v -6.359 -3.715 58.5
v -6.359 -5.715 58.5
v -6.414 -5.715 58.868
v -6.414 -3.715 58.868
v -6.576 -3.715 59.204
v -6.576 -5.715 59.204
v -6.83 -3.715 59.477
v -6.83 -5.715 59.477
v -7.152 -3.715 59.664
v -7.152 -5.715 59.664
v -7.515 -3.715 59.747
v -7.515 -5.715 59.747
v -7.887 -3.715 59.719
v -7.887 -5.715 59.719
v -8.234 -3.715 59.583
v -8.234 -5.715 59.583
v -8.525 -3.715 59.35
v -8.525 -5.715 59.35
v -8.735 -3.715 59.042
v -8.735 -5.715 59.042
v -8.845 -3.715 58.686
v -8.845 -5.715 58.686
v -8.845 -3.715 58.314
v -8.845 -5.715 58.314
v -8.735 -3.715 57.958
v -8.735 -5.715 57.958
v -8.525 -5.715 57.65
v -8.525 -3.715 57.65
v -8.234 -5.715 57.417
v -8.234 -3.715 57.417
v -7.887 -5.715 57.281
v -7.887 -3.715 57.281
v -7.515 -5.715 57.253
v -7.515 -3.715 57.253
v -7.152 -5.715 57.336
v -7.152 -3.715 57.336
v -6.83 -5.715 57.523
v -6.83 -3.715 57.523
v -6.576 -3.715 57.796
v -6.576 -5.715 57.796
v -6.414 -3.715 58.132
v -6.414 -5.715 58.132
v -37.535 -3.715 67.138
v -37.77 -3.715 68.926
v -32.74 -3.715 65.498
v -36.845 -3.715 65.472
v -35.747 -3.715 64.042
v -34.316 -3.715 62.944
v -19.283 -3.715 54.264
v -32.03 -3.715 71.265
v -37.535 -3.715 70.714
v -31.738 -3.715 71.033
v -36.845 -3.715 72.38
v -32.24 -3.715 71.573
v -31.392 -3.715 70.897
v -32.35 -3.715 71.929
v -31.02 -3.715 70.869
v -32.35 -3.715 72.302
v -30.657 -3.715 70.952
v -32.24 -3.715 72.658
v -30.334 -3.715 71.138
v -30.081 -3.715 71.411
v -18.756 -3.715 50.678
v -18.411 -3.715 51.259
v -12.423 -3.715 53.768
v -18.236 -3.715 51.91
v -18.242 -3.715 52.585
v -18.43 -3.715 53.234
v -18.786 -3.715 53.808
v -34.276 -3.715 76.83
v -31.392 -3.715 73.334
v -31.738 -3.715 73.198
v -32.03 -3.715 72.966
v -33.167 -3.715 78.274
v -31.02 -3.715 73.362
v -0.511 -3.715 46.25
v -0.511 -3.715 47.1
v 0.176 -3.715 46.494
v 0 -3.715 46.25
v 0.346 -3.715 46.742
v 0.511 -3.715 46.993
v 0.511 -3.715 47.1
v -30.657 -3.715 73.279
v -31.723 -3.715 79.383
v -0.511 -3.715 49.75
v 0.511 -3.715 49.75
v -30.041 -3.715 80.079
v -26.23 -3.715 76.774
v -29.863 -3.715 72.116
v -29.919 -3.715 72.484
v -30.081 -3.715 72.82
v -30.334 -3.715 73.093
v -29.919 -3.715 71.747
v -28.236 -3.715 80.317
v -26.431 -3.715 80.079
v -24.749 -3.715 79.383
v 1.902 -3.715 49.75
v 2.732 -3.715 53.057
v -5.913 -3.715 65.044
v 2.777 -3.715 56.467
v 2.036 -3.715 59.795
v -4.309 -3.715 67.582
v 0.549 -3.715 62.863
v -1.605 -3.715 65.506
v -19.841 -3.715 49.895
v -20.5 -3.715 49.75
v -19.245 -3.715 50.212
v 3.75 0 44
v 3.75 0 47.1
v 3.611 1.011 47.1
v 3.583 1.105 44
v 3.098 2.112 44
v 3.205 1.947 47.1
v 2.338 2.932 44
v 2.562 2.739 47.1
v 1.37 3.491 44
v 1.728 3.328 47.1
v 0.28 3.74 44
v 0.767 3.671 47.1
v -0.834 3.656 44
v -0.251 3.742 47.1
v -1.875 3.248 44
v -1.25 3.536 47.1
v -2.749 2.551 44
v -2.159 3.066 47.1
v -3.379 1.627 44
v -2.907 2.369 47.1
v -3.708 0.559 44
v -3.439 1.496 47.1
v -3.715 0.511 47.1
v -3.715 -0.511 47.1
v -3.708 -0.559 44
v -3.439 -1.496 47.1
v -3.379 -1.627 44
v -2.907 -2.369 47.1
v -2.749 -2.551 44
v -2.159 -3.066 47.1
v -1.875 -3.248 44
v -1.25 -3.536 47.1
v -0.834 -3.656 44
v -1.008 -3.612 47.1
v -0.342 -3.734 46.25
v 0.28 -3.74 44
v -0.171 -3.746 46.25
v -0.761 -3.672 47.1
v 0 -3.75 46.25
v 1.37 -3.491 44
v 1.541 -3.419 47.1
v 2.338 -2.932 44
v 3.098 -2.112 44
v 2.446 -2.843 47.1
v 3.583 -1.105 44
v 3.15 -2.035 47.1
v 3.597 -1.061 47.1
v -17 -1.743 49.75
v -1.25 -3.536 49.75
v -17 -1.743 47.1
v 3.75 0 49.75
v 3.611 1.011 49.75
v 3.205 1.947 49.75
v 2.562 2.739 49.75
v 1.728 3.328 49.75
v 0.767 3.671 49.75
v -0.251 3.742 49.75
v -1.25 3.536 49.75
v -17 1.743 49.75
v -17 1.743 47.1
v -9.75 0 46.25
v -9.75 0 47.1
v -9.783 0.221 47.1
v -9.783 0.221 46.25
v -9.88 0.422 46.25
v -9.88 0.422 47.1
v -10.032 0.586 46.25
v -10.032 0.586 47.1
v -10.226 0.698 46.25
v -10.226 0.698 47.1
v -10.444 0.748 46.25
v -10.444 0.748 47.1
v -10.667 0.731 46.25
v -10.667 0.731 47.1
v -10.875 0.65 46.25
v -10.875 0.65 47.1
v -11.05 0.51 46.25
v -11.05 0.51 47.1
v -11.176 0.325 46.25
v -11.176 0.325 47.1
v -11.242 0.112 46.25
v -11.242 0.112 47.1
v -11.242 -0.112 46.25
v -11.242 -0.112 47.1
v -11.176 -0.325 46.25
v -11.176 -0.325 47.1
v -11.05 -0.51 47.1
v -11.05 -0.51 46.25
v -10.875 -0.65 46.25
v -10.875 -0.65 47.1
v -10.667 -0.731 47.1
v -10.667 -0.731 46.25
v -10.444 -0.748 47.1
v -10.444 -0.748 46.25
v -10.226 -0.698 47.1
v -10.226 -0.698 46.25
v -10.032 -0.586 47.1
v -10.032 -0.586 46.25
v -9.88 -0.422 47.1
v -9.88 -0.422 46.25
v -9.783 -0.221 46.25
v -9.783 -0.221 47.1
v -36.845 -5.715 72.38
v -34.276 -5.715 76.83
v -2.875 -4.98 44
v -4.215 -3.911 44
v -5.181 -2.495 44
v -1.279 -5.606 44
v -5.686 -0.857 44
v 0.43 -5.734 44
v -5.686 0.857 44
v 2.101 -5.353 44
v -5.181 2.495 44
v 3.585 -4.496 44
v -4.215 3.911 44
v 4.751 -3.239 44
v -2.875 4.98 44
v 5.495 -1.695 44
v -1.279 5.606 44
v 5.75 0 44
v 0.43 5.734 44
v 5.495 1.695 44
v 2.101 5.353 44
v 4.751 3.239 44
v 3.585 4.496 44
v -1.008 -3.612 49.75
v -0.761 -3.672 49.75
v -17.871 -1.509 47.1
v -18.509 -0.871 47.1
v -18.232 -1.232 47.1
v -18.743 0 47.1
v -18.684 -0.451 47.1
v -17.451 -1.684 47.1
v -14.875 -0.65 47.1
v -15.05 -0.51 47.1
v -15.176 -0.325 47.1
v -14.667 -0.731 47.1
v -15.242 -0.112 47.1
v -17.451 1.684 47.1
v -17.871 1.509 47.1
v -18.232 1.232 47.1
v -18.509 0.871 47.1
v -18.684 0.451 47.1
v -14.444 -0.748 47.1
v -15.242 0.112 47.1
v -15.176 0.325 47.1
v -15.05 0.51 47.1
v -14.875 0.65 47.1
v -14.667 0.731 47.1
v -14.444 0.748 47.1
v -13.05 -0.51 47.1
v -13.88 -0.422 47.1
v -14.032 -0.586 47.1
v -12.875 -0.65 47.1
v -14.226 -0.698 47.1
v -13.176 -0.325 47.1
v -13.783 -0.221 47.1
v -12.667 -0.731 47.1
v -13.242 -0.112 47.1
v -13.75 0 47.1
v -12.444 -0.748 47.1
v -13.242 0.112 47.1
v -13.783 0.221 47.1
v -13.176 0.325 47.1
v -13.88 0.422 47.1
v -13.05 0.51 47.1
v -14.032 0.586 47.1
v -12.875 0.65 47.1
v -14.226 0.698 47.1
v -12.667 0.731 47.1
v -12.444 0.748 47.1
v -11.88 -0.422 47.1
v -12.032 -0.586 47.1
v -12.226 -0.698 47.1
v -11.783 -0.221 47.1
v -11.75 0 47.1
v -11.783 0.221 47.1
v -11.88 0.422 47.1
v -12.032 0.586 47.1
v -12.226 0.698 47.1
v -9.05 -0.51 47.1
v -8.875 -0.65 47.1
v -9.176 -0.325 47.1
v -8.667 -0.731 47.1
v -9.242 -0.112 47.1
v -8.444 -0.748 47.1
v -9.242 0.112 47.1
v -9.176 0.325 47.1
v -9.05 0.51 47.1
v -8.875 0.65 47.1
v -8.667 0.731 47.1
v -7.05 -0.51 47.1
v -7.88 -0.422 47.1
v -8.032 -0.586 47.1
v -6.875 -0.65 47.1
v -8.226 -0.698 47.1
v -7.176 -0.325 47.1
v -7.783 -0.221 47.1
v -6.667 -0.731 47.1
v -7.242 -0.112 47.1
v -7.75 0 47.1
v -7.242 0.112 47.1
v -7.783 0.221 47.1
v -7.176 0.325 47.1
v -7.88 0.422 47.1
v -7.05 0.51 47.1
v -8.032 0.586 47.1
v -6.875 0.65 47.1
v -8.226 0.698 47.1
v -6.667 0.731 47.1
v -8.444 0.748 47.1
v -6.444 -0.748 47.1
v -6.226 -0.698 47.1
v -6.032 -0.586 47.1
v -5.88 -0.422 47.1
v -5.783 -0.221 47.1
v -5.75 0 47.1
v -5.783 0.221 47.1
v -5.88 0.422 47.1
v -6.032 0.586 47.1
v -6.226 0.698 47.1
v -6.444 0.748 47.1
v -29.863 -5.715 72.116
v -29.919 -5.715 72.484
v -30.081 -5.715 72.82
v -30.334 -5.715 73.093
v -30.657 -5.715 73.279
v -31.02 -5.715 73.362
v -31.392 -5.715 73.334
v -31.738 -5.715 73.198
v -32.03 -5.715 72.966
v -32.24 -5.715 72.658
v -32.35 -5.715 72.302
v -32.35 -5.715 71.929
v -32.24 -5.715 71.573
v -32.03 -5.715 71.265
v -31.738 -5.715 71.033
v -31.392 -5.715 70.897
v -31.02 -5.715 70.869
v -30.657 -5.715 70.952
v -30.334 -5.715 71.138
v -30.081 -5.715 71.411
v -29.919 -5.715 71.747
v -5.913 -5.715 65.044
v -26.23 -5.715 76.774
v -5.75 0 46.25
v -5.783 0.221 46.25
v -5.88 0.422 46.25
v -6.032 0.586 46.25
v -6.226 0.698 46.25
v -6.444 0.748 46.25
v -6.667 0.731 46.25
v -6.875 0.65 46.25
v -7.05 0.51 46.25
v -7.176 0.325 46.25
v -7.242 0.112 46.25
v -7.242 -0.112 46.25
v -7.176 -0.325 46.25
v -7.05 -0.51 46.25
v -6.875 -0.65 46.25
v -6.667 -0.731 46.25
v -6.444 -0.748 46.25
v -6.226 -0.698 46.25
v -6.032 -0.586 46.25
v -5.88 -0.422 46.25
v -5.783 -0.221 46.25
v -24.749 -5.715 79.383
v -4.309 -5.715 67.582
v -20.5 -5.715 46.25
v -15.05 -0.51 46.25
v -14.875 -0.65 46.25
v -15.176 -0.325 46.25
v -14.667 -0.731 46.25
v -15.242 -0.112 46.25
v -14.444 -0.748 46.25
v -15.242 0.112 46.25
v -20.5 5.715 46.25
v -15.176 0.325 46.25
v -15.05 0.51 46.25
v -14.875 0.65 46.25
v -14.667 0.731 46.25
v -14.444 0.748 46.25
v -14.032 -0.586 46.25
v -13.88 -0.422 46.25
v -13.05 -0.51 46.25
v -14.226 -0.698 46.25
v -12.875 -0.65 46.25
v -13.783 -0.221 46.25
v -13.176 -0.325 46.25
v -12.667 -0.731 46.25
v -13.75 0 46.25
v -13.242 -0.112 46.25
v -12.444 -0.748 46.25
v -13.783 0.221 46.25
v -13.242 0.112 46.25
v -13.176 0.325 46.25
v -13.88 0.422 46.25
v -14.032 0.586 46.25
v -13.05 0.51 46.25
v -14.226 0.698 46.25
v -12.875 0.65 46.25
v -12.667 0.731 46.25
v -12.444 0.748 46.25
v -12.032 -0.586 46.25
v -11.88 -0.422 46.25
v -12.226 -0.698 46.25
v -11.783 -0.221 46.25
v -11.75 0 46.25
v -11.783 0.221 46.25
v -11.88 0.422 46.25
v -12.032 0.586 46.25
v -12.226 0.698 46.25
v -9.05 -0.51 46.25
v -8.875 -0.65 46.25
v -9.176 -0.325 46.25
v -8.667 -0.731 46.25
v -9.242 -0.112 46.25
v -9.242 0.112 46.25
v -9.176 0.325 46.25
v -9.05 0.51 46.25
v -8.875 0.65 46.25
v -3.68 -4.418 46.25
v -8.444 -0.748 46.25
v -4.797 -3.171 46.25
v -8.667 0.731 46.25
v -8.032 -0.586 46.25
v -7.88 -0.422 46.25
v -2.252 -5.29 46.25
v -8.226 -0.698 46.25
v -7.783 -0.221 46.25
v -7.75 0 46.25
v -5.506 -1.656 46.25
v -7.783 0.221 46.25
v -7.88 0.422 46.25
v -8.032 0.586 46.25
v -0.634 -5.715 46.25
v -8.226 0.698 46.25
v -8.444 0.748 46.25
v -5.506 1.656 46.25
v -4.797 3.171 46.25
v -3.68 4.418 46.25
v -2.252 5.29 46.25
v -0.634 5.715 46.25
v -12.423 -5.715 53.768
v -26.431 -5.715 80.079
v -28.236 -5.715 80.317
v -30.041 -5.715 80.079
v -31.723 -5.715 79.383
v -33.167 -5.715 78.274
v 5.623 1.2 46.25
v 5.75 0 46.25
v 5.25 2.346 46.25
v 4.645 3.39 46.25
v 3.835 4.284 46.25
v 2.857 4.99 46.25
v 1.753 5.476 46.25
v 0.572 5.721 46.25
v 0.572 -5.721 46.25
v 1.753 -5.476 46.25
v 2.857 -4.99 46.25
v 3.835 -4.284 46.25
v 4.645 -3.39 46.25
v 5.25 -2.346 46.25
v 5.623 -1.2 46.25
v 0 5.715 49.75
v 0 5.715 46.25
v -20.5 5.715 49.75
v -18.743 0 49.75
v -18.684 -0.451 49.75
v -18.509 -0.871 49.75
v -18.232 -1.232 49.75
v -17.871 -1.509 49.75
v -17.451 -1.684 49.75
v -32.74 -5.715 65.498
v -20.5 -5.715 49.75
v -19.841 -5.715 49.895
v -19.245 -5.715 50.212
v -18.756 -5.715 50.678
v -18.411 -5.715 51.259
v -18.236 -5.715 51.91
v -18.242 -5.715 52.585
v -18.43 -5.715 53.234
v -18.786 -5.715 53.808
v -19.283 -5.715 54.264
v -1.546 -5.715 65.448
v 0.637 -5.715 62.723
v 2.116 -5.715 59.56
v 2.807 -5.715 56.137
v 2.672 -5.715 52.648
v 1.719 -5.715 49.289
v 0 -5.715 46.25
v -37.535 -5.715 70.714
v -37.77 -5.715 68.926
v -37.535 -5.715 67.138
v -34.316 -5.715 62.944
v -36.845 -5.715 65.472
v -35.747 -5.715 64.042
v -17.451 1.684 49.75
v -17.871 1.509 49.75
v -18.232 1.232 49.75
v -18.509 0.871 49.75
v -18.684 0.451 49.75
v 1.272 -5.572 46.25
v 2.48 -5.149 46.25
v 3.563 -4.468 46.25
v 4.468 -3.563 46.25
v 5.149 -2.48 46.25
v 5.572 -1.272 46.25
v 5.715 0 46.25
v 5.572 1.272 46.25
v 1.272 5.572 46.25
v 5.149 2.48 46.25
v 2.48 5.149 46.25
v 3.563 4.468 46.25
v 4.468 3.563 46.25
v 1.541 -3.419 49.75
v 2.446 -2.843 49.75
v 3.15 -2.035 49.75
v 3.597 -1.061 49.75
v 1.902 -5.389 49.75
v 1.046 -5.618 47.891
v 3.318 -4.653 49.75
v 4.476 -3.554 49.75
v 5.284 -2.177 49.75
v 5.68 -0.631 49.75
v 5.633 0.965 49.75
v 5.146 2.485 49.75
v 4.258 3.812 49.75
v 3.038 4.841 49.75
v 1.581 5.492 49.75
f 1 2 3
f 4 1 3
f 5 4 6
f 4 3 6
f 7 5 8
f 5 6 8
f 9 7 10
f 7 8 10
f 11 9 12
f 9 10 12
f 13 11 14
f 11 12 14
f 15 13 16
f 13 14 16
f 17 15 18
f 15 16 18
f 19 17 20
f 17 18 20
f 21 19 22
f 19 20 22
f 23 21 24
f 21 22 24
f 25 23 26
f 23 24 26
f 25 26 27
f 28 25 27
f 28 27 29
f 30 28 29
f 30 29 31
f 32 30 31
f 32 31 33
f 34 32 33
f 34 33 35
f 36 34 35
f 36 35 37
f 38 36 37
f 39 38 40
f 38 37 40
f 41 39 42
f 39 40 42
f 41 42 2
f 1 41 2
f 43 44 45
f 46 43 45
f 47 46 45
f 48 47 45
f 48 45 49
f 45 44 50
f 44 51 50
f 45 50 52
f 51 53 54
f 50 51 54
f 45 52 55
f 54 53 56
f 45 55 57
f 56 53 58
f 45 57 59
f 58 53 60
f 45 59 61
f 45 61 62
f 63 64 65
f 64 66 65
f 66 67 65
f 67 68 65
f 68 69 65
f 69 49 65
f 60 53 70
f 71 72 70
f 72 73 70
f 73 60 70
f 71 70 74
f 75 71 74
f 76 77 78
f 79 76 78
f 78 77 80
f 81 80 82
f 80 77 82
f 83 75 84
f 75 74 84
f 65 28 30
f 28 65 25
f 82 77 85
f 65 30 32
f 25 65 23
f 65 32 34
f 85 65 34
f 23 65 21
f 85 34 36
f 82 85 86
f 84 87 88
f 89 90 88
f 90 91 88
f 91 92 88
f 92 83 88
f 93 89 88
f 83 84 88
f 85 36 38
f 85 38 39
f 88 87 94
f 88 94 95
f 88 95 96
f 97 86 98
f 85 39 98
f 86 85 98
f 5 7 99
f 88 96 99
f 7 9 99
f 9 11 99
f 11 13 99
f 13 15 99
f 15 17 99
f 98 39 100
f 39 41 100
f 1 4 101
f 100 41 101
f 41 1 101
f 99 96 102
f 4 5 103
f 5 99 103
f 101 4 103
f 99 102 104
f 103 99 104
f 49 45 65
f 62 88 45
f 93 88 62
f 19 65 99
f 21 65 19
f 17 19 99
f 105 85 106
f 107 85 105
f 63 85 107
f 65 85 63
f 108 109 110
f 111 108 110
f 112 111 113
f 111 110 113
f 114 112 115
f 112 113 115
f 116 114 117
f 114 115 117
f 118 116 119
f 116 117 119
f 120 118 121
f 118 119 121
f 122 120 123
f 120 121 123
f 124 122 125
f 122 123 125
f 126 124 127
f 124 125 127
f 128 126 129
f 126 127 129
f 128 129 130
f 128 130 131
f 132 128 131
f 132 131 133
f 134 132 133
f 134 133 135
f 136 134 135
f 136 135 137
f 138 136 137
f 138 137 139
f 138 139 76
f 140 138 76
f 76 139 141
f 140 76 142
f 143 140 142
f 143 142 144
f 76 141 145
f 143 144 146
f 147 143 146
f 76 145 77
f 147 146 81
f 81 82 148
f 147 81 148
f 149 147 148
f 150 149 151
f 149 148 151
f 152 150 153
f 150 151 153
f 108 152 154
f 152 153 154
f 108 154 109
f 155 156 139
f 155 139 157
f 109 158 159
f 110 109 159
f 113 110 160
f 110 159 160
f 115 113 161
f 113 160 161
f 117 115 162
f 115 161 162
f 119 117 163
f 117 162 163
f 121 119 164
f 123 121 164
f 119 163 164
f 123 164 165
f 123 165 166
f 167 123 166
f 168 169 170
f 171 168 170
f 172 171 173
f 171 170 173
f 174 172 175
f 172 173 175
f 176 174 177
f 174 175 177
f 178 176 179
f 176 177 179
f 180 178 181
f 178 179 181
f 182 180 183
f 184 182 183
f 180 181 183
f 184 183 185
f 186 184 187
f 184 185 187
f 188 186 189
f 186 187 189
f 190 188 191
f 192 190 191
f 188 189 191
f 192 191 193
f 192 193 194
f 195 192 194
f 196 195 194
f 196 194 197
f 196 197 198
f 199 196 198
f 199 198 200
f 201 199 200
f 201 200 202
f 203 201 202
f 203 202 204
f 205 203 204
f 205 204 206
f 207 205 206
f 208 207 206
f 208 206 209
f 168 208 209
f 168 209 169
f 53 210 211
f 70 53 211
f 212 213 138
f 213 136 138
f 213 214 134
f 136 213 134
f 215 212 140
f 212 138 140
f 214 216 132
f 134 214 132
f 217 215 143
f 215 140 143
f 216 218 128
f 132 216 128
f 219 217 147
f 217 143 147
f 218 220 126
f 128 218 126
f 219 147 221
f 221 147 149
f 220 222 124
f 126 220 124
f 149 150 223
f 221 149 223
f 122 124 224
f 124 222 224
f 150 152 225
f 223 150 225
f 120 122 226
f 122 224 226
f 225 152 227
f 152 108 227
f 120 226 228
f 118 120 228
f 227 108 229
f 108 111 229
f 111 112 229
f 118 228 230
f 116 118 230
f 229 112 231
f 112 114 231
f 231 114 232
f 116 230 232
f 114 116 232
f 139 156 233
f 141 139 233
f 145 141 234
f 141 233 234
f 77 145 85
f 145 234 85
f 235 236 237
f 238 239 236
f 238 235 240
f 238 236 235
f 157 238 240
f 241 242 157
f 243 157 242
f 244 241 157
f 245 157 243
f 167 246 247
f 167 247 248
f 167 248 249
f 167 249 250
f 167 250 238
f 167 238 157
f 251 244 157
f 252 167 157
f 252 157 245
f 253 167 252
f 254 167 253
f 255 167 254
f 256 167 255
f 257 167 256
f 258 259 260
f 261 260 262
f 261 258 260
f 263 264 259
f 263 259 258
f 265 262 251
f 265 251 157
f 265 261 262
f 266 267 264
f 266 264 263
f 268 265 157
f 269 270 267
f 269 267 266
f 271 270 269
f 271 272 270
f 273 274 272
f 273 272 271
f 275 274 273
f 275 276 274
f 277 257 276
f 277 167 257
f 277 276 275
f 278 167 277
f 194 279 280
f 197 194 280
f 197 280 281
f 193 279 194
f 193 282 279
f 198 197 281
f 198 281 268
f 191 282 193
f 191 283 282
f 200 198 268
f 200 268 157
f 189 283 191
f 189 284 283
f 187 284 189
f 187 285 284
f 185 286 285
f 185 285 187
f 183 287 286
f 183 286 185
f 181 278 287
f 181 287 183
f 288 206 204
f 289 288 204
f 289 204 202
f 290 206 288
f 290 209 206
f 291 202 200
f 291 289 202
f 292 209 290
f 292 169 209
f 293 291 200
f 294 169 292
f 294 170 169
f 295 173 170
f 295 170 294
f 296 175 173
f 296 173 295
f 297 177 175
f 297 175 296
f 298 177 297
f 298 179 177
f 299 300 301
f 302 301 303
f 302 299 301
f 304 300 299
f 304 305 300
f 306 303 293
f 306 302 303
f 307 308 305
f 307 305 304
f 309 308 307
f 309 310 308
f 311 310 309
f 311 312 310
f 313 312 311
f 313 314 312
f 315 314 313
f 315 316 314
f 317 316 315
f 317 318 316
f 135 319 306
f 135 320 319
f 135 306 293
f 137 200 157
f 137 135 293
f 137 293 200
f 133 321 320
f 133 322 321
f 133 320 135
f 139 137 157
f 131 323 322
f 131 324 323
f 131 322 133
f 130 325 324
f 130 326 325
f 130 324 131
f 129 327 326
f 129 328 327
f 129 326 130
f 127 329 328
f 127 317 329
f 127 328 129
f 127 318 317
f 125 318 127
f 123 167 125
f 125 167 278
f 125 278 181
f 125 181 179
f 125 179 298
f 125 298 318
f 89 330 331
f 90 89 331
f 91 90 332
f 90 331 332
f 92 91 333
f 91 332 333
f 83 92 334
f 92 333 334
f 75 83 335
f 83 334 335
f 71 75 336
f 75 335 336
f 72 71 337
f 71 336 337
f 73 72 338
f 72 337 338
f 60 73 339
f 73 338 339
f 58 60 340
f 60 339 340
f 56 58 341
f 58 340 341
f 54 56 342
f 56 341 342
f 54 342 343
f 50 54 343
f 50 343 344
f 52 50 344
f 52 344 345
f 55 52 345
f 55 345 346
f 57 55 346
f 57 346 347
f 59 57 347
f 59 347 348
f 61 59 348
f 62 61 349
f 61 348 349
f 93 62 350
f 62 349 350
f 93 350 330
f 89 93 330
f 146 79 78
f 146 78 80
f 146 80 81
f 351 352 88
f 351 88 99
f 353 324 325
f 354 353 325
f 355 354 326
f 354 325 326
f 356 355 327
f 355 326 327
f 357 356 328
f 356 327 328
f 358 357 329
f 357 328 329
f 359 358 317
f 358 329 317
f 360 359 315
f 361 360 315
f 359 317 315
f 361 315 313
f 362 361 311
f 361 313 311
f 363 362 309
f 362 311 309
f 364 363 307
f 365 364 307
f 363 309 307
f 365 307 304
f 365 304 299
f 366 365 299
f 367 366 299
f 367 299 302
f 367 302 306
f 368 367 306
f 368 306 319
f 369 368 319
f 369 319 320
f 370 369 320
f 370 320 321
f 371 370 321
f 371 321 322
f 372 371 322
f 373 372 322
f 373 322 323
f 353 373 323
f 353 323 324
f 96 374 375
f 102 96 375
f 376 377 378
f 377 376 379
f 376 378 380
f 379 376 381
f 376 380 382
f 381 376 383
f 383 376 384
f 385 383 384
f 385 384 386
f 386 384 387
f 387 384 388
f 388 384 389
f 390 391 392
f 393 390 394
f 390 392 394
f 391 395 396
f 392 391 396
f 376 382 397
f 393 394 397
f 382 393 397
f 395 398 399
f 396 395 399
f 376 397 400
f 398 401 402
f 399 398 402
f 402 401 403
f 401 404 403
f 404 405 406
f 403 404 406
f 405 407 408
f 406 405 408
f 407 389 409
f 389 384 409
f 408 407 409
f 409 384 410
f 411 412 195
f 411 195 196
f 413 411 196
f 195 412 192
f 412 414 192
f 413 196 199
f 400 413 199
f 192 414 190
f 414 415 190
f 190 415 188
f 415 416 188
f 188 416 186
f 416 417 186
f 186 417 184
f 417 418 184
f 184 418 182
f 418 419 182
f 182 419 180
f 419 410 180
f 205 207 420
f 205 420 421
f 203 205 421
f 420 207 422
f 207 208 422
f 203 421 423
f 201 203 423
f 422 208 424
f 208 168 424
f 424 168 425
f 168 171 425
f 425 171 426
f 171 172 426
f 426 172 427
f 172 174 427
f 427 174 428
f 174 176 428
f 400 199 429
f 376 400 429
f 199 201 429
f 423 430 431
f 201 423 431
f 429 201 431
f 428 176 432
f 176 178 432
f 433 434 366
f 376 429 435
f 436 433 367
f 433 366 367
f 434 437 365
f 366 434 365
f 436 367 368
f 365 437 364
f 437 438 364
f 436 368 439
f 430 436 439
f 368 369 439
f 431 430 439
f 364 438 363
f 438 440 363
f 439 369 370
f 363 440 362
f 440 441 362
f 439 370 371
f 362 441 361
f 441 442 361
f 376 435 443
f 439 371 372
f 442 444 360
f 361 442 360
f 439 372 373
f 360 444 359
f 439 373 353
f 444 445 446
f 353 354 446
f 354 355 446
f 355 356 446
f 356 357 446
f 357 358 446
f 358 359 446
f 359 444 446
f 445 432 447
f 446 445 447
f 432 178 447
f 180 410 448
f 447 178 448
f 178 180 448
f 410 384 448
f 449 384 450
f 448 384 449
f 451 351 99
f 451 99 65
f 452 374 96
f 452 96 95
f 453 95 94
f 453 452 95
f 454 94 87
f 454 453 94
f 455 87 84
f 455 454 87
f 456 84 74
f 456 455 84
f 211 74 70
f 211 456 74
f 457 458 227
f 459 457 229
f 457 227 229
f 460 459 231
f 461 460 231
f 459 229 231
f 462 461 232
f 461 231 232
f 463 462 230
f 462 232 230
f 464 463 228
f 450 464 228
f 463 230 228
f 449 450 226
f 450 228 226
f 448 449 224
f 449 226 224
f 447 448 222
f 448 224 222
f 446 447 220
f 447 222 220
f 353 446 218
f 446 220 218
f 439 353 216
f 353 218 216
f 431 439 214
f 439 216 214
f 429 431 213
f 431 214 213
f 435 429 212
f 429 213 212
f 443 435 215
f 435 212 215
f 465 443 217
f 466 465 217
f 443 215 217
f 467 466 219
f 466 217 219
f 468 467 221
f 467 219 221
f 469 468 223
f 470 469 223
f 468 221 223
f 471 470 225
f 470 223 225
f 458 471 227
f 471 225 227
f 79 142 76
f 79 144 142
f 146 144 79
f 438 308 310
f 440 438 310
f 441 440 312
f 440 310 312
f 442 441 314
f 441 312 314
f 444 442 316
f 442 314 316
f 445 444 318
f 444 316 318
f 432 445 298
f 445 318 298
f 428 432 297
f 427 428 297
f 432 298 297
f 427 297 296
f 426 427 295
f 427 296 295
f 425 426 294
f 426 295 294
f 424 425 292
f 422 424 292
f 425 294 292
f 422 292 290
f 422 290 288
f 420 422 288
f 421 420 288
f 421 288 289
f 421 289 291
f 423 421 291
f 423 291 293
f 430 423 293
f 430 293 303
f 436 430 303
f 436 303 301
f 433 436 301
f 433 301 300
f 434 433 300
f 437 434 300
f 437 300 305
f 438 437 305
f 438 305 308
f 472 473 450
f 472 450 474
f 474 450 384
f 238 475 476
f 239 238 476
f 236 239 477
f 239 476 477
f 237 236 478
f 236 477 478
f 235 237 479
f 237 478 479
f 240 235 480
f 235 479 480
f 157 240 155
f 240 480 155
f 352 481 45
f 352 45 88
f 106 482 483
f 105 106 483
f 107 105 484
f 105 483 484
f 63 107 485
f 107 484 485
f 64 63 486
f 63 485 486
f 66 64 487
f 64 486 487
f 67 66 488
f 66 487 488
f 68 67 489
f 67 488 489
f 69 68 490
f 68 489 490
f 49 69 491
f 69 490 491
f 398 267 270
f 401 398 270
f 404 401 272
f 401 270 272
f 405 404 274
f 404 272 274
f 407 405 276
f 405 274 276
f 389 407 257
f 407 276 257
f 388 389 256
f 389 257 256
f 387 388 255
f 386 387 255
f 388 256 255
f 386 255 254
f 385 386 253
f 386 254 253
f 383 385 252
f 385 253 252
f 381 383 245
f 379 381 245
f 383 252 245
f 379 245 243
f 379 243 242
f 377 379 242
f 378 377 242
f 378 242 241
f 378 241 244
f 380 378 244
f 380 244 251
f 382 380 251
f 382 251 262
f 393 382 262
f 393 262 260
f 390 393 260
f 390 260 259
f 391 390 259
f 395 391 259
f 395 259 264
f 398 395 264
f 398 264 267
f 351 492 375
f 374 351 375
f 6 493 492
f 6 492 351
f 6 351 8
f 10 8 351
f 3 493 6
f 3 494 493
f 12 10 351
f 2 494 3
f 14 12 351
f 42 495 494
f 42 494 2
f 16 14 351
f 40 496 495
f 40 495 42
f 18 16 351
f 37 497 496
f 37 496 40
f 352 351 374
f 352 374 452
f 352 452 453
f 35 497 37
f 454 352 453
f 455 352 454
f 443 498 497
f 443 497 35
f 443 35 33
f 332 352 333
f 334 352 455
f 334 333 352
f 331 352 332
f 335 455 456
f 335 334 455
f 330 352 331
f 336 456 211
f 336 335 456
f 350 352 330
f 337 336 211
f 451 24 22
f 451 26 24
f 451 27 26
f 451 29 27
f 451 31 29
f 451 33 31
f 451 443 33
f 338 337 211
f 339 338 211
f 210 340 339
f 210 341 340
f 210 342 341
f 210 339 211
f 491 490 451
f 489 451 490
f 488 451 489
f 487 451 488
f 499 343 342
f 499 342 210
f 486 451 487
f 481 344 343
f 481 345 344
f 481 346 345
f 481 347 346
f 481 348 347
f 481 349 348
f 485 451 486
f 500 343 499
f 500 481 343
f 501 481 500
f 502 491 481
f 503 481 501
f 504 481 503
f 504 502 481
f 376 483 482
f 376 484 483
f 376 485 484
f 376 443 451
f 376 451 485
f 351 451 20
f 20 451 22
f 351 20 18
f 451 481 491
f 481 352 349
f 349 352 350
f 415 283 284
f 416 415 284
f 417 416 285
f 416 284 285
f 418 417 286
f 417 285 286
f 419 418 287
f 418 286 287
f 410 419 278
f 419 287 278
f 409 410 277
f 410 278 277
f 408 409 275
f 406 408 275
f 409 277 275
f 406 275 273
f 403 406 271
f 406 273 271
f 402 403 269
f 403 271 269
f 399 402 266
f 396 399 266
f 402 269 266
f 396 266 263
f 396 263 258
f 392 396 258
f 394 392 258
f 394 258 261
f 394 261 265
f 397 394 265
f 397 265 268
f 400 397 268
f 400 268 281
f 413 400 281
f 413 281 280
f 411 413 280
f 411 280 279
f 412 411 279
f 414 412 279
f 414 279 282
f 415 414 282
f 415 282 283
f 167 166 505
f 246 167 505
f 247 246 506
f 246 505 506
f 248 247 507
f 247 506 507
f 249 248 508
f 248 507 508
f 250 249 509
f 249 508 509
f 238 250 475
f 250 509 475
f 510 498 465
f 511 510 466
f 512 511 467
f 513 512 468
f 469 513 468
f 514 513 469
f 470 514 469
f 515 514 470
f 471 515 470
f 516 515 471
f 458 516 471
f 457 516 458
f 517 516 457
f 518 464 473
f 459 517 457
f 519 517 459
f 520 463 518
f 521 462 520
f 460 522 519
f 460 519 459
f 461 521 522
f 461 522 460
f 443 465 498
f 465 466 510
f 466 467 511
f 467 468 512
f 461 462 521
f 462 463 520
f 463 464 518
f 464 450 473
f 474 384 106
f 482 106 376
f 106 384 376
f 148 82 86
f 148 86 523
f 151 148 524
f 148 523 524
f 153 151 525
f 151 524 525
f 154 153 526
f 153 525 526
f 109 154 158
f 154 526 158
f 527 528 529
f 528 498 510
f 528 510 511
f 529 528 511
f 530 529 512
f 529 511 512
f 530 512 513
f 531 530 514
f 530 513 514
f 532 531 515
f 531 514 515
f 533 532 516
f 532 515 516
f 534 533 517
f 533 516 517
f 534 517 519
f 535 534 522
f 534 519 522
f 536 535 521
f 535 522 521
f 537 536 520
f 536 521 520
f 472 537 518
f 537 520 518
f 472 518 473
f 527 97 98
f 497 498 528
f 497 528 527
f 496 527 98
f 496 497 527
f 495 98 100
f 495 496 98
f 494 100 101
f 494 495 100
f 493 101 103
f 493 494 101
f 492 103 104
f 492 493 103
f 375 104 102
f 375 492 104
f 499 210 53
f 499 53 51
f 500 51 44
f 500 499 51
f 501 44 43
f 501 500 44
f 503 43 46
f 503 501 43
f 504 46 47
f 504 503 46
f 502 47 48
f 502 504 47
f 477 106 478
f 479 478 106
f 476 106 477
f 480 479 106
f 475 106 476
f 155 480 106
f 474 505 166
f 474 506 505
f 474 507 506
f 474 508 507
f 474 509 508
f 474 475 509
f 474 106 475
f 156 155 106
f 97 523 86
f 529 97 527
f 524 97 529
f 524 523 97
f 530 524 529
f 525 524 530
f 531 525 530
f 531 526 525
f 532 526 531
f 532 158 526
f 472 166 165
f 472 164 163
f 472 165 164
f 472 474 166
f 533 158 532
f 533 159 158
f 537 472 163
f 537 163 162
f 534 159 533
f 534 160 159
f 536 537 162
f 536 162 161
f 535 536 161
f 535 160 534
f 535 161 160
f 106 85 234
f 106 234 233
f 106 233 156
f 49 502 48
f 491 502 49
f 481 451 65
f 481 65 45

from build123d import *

# Parameters (mm, degrees)
SKETCH051_R        = 5.75
SKETCH051_R_2      = 3.75
PAD012002_DEPTH    = 2.25
PAD012003_DEPTH    = 3.5
POCKET003052_DEPTH = 2.65
SKETCH054_R        = 3.75
SKETCH054_R_2      = 0.75
POCKET003053_DEPTH = 5
SKETCH055_R        = 1.25
PAD012004_DEPTH    = 2


with BuildPart() as part:
    # Sketch051 → Pad012002 (new body)
    with BuildSketch(Plane.XY):
        Circle(SKETCH051_R)
        Circle(SKETCH051_R_2, mode=Mode.SUBTRACT)
    extrude(amount=PAD012002_DEPTH)

    # Sketch053 (on Face4 of Pad012002) → Pad012003 (join)
    with BuildSketch(Plane.XY.offset(2.25)):
        with BuildLine():
            Line((0, 5.714965), (-20.5, 5.714965))
            Line((-20.5, 5.714965), (-20.5, -5.714965))
            Line((0, -5.714965), (-20.5, -5.714965))
            ThreePointArc((0, -5.714965), (5.714965, 0), (0, 5.714965))
        make_face()
    extrude(amount=PAD012003_DEPTH)

    # Sketch052 (on Face11 of Pad012003) → Pocket003052 (cut)
    with BuildSketch(Plane.XY.offset(5.75)):
        with BuildLine():
            Line((-1.25, 3.535534), (-16.999999, 1.742953))
            ThreePointArc((-16.999999, 1.742953), (-18.232454, 1.232454), (-18.742953, 0))
            ThreePointArc((-18.742953, 0), (-18.232454, -1.232454), (-16.999999, -1.742953))
            Line((-1.25, -3.535534), (-16.999999, -1.742953))
            ThreePointArc((-1.25, -3.535534), (2.165064, -3.061862), (3.75, 0))
            ThreePointArc((3.75, 0), (2.165064, 3.061862), (-1.25, 3.535534))
        make_face()
    extrude(amount=-POCKET003052_DEPTH, mode=Mode.SUBTRACT)

    # Sketch054 (on Face16 of Pocket003052) → Pocket003053 (cut)
    with BuildSketch(Plane.XY.offset(3.1)):
        Circle(SKETCH054_R)
        with Locations((-14.5, 0)):
            Circle(SKETCH054_R_2)
        with Locations((-12.5, 0)):
            Circle(SKETCH054_R_2)
        with Locations((-10.5, 0)):
            Circle(SKETCH054_R_2)
        with Locations((-8.5, 0)):
            Circle(SKETCH054_R_2)
        with Locations((-6.5, 0)):
            Circle(SKETCH054_R_2)
    extrude(amount=-POCKET003053_DEPTH, mode=Mode.SUBTRACT)

    # Sketch055 (on Face2 of Pocket003053) → Pad012004 (join)
    with BuildSketch(Plane.XZ.offset(5.714965)):
        with BuildLine():
            Line((-20.5, 2.25), (0, 2.25))
            ThreePointArc((0, 2.25), (2.563672, 13.869245), (-4.309476, 23.582077))
            Line((-24.748606, 35.382614), (-4.309476, 23.582077))
            ThreePointArc((-24.748606, 35.382614), (-30.040757, 36.079339), (-34.275532, 32.829882))
            Line((-36.844536, 28.380237), (-34.275532, 32.829882))
            ThreePointArc((-36.844536, 28.380237), (-37.534628, 23.138468), (-34.316106, 18.944009))
            Line((-34.316106, 18.944009), (-19.282618, 10.264421))
            ThreePointArc((-20.5, 5.75), (-18.301189, 7.578411), (-19.282618, 10.264421))
            Line((-20.5, 5.75), (-20.5, 2.25))
        make_face()
        with Locations((-31.113487, 28.115616)):
            Circle(SKETCH055_R, mode=Mode.SUBTRACT)
        with Locations((-7.608902, 14.5)):
            Circle(SKETCH055_R, mode=Mode.SUBTRACT)
        Polygon((-32.740181, 21.49825), (-26.230181, 32.773901), (-5.913225, 21.043901), (-12.423225, 9.76825), align=None, mode=Mode.SUBTRACT)
    extrude(amount=-PAD012004_DEPTH)


with BuildPart() as part_1:
    # Body010 placement: moved
    add(part.part.moved(Location((0, 0, 44))))


solid = part_1.part
